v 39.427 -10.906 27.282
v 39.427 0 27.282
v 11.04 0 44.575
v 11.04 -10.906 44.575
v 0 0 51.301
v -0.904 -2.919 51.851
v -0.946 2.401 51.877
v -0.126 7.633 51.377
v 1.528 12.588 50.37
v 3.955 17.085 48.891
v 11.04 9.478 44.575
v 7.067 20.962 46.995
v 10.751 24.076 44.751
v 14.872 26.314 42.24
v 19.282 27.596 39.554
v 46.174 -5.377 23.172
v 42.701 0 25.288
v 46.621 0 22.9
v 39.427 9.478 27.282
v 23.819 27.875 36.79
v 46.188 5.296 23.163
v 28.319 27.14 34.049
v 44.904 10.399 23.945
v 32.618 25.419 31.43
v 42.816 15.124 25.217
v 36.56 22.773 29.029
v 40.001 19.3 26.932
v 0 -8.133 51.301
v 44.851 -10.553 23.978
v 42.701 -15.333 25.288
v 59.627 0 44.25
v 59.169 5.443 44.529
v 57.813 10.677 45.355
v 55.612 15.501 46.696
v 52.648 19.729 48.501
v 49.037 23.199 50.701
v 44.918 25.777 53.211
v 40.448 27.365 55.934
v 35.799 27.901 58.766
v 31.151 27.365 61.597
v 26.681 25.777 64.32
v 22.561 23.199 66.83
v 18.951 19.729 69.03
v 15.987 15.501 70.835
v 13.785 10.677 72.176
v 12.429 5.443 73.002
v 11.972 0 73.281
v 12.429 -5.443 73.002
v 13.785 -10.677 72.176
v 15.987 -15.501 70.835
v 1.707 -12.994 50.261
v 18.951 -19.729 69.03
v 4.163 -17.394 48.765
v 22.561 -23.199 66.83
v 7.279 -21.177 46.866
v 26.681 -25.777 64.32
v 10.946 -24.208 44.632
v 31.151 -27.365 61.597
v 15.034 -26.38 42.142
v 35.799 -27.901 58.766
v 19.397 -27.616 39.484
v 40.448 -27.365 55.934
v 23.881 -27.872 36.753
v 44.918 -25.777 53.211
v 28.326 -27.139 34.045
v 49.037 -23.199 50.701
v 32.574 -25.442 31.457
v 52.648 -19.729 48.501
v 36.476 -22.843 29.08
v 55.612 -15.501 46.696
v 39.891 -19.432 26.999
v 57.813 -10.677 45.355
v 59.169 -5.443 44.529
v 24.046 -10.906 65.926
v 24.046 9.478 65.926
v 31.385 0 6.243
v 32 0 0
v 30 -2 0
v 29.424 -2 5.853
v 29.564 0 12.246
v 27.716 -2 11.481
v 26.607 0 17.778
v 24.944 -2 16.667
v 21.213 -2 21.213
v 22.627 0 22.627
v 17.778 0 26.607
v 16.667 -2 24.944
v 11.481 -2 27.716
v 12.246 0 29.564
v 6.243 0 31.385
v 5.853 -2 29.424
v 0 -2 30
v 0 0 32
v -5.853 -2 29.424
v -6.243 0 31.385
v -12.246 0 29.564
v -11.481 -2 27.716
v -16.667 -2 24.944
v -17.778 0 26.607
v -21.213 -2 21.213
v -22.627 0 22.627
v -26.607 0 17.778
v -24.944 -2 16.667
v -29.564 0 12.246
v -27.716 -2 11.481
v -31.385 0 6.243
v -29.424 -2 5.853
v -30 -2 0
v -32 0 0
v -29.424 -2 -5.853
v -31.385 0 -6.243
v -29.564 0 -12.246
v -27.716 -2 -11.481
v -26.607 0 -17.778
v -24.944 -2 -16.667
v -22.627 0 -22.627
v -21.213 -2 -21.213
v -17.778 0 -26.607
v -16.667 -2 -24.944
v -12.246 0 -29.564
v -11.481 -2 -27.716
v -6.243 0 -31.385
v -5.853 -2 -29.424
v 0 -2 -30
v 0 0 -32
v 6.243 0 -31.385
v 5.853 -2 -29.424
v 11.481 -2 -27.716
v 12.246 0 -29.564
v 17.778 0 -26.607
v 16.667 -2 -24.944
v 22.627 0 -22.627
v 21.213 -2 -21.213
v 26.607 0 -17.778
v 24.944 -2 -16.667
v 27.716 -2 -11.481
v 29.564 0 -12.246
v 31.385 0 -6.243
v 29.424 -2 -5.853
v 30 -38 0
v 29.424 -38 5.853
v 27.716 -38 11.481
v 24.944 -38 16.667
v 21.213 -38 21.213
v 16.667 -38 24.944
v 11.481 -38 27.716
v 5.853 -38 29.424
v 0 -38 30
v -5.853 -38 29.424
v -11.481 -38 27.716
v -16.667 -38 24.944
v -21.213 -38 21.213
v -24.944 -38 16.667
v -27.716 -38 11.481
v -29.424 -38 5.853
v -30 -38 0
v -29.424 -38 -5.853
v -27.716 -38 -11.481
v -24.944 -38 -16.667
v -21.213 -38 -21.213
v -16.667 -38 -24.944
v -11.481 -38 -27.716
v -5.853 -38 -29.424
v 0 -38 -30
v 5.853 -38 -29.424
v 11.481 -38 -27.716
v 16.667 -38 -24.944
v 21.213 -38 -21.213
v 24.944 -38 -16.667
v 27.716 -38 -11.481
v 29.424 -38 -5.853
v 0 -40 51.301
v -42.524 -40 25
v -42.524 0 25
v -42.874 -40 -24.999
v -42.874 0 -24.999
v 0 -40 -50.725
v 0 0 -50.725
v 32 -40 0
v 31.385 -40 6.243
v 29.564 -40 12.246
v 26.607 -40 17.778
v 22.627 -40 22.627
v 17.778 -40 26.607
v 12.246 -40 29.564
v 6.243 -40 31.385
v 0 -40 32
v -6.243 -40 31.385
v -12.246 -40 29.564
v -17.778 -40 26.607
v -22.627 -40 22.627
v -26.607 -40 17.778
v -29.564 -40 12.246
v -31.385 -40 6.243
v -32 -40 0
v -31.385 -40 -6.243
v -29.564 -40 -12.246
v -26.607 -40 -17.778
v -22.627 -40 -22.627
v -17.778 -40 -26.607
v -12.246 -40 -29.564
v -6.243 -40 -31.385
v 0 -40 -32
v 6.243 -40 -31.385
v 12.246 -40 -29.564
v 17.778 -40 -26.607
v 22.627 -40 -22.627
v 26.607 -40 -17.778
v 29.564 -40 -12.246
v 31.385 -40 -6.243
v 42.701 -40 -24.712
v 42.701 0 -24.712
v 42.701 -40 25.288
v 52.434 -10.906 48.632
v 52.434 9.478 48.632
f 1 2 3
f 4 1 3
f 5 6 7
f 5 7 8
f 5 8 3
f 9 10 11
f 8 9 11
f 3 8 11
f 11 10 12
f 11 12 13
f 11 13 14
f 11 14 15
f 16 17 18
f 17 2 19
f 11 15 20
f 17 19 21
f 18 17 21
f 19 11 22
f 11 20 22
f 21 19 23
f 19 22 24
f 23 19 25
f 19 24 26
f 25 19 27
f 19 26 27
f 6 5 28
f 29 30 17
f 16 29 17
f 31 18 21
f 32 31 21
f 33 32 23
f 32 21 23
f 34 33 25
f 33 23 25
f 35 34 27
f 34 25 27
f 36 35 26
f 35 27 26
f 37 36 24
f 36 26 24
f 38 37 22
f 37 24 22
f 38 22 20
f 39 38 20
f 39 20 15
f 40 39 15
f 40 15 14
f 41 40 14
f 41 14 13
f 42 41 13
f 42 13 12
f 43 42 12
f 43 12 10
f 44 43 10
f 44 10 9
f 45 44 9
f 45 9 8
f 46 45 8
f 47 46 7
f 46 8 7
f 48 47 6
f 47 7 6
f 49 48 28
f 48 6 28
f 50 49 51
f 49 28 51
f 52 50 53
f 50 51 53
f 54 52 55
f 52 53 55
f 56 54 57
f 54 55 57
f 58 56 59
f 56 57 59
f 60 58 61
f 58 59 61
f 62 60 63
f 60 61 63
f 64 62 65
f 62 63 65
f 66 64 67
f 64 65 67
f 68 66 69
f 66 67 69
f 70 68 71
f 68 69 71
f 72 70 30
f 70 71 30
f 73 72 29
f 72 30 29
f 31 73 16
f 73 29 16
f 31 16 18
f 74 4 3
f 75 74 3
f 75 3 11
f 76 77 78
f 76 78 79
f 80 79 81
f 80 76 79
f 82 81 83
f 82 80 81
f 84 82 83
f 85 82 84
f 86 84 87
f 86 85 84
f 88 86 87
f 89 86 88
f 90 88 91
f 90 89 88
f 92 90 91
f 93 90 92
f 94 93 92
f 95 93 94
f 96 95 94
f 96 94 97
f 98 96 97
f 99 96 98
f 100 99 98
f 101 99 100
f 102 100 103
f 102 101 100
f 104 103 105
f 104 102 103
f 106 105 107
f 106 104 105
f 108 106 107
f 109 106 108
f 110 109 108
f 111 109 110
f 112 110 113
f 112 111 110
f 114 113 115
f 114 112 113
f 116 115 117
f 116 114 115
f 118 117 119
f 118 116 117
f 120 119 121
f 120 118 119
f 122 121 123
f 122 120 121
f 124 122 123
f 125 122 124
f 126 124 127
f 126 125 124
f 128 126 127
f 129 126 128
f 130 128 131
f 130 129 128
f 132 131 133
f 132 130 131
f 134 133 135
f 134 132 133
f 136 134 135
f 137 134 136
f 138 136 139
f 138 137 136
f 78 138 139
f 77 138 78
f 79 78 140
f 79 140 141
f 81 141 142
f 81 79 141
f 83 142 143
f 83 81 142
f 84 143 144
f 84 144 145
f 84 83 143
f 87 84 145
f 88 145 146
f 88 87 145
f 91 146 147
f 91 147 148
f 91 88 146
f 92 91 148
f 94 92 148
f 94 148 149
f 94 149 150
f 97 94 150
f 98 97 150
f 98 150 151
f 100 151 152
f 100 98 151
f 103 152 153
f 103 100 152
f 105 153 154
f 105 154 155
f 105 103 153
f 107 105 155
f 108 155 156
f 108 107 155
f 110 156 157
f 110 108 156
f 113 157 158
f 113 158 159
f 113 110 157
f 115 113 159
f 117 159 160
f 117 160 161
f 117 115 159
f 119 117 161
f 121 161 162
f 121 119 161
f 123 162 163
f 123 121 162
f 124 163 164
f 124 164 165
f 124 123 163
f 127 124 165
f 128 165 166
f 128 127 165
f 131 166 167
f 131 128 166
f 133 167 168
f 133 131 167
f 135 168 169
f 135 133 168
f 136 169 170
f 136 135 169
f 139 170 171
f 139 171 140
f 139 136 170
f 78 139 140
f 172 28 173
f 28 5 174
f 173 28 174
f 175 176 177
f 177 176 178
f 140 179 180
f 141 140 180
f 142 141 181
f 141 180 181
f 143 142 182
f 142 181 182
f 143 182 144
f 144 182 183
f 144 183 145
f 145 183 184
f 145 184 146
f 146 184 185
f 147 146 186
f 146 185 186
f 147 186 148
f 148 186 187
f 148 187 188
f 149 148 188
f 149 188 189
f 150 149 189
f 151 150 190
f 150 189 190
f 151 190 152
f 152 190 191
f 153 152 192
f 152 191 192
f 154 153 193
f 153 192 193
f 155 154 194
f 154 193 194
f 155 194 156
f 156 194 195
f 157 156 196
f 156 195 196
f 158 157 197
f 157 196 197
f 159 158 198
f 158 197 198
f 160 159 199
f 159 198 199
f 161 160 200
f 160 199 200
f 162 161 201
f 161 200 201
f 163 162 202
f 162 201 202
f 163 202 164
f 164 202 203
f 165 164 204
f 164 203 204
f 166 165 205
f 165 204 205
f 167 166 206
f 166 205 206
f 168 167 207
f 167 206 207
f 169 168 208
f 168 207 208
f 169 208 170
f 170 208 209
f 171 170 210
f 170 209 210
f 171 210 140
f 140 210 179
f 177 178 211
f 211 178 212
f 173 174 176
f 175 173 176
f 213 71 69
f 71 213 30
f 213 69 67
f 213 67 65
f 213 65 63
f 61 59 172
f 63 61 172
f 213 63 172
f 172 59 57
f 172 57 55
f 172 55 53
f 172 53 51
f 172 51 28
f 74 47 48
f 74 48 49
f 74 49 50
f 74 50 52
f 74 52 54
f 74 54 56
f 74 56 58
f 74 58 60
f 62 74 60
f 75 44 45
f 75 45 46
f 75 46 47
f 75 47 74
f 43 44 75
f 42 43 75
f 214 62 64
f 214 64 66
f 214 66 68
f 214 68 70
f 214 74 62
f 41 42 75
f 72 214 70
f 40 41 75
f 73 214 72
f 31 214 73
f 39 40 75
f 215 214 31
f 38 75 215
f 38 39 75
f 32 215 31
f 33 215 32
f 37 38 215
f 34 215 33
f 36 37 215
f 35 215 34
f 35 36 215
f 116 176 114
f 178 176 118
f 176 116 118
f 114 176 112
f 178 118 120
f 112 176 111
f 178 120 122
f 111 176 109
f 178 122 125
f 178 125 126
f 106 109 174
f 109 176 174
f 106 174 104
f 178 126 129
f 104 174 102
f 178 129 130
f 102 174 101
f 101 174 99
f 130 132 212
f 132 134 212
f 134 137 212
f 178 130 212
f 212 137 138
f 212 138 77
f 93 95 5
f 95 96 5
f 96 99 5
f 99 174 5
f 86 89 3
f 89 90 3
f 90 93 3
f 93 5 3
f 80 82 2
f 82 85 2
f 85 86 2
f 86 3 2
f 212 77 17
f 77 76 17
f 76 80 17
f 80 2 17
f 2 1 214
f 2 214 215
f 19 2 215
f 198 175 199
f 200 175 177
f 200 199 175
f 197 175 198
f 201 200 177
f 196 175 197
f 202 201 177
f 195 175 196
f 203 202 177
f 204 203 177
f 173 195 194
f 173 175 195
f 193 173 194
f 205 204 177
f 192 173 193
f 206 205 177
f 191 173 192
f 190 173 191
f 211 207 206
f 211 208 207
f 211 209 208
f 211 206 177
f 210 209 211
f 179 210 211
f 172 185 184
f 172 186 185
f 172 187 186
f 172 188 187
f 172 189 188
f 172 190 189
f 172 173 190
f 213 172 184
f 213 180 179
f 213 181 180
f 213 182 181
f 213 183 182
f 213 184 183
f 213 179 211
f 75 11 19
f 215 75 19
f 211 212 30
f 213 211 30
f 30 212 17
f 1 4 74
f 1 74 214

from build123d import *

# Parameters (mm, degrees)
F0_R     = 30
F1_DEPTH = 40
F2_SIZE  = 2
F3_R     = 27.9010613337
F3_W     = 33.2406070083
F3_H     = 20.383390598
F4_DEPTH = 25


with BuildPart() as f1:
    # F0 (on Front) → F1 (new body)
    with BuildSketch(Plane.XZ):
        Polygon((0, 51.3005799085), (-42.5238697261, 25), (-42.8737902332, -24.9987755414), (0, -50.724990013), (42.7005271465, -24.7122050523), (42.7005271465, 25.2877949477), align=None)
        Circle(F0_R, mode=Mode.SUBTRACT)
    extrude(amount=F1_DEPTH)

    # F2
    f2_edges = [f1.edges().sort_by_distance(p)[0] for p in [
        (-30, -40, 0),
        (-30, 0, 0),
    ]]
    chamfer(f2_edges, length=F2_SIZE)

    # F3 (on face) → F4 (join)
    with BuildSketch(Plane(origin=(22.7930452708, 0, 37.4152575284), x_dir=(0.8540105429, 0, -0.5202556992), z_dir=(0.5202556992, 0, 0.8540105429))):
        Circle(F3_R)
        with Locations((2.8576394543, -0.7141805254)):
            Rectangle(F3_W, F3_H, mode=Mode.SUBTRACT)
    extrude(amount=F4_DEPTH)


solid = f1.part
